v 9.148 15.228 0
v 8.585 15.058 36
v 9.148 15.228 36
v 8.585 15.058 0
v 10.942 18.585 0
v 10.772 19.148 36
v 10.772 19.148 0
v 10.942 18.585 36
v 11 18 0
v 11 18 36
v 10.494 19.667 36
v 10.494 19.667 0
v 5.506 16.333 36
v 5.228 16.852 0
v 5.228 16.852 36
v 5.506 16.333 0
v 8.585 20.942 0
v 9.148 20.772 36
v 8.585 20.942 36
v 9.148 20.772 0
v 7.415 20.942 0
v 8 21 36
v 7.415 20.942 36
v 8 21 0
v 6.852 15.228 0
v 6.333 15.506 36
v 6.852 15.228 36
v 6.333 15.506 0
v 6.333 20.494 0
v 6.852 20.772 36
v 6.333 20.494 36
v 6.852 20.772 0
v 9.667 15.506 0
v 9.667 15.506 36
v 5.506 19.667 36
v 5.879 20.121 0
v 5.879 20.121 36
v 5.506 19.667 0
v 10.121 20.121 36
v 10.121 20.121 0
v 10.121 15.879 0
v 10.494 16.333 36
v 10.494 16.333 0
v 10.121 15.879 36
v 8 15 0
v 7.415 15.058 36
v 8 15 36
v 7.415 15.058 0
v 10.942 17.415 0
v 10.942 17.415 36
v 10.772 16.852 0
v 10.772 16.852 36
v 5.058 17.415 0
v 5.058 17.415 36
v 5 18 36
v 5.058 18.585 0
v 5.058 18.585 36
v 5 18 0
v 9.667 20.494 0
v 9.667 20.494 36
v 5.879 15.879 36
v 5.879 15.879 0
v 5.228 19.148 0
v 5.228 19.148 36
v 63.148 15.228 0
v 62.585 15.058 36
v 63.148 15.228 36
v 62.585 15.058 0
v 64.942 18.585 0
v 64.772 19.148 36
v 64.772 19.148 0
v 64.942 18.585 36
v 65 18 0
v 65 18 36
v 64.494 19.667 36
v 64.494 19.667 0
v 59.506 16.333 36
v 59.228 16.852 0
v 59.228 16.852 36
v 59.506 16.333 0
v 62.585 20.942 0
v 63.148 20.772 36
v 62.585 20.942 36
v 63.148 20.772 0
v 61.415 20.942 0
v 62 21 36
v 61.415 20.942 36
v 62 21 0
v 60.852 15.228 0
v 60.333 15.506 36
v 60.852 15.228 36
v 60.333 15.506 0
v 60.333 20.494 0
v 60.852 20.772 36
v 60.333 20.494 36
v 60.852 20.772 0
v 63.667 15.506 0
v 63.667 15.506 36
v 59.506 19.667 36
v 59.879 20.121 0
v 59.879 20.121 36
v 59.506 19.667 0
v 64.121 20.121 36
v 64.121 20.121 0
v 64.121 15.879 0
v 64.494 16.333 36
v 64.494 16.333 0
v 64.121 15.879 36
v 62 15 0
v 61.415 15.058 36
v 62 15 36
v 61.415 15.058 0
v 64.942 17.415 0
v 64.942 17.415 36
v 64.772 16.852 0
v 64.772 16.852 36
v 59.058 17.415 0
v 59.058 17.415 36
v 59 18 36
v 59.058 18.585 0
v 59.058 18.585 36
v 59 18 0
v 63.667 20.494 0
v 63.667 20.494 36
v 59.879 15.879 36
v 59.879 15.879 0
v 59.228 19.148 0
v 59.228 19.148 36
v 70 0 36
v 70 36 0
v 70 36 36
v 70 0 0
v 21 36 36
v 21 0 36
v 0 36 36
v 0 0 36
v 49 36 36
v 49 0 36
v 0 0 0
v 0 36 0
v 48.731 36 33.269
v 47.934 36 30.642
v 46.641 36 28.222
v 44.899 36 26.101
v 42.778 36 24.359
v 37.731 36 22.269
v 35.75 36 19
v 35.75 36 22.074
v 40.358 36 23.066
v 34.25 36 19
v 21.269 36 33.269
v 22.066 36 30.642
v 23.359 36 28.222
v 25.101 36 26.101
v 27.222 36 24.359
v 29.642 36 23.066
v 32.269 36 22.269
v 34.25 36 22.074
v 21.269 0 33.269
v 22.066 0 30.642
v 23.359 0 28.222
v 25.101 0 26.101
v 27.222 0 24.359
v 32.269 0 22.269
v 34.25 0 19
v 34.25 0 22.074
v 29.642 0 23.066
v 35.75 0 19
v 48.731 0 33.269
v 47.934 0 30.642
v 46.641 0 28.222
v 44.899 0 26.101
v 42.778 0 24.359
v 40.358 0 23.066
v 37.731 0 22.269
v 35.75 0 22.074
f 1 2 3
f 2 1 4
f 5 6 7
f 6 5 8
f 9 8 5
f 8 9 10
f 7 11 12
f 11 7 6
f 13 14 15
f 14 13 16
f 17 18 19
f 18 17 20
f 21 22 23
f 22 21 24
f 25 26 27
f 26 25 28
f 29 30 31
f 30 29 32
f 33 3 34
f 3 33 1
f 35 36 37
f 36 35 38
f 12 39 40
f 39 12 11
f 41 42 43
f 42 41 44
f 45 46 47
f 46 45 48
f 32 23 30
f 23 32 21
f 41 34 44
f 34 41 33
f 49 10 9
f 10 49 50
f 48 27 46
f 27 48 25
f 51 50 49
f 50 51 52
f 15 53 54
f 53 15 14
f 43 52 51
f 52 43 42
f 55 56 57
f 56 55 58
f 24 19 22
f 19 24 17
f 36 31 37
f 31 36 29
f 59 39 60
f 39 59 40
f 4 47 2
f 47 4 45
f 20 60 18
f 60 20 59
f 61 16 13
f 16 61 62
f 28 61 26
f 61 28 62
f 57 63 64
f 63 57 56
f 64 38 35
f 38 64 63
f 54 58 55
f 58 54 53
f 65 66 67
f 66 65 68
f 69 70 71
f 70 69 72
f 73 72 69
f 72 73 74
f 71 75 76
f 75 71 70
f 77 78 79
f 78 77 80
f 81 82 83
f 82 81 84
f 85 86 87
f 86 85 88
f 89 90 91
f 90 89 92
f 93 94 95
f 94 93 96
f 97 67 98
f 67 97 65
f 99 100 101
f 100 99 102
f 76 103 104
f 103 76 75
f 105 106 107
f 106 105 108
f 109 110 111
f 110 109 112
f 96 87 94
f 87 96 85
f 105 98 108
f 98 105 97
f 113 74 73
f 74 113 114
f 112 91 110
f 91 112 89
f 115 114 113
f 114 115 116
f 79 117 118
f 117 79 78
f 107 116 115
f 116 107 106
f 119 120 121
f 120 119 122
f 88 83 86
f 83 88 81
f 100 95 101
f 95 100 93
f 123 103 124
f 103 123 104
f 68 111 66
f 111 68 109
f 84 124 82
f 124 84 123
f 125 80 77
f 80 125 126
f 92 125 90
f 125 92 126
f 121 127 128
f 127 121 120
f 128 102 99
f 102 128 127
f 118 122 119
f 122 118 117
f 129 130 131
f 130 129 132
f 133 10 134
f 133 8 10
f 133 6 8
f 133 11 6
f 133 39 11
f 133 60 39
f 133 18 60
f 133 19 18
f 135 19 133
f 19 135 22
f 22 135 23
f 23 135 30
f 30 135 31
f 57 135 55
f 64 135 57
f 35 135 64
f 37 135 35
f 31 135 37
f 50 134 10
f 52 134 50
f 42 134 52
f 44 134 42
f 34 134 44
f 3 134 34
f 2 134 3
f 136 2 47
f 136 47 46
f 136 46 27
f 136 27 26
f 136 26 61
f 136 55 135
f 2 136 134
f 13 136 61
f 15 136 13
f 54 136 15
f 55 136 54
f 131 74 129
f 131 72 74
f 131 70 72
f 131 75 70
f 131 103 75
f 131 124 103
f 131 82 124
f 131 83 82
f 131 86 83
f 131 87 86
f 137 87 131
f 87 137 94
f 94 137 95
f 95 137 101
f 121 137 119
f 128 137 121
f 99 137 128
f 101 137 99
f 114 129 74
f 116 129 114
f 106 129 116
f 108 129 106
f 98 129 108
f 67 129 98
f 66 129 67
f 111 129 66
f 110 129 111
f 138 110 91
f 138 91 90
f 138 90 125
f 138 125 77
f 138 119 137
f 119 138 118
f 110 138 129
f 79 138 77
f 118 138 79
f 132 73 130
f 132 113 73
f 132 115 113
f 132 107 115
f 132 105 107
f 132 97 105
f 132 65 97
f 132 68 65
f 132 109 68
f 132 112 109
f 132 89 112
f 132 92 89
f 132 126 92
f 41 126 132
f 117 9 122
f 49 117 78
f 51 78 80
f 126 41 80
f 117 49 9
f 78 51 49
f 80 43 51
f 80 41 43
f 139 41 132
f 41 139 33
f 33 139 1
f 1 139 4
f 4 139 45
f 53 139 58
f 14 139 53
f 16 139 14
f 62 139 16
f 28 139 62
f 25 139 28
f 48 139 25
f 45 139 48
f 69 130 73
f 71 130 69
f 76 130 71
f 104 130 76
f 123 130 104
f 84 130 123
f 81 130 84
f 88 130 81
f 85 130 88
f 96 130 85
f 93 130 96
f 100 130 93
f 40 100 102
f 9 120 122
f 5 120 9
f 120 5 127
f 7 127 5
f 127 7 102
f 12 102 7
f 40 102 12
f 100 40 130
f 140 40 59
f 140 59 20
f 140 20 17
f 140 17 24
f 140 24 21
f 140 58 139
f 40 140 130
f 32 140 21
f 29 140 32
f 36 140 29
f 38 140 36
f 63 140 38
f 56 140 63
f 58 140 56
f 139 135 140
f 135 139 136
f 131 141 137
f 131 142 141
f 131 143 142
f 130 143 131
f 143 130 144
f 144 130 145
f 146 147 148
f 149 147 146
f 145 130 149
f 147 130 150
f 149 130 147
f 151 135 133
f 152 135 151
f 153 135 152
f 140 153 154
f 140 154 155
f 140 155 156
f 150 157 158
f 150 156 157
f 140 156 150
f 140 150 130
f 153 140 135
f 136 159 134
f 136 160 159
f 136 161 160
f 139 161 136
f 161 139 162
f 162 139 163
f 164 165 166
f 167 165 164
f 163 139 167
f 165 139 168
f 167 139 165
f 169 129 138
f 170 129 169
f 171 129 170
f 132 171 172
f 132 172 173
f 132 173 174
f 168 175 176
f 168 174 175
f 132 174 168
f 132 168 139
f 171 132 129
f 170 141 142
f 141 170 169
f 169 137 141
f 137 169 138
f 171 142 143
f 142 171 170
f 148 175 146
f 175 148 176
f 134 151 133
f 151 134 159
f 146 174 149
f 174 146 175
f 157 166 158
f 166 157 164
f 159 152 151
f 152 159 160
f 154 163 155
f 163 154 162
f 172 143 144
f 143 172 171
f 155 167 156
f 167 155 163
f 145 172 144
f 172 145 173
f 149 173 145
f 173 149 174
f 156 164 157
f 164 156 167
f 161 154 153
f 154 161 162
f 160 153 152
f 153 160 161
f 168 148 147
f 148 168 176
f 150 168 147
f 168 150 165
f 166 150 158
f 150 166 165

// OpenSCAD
$fn = 32;

// ----------------------------------------------------------------------
// Saddle clamp: split shaft clamp
// ----------------------------------------------------------------------

// --- parameters (mm) ---
blk_l = 70;               // block length, X
blk_w = 36;               // block width, Y
blk_h = 36;               // block height
clamp_r = 14;             // shaft groove radius
hole_r = 3;               // bolt hole radius
hole_m = 8;               // bolt hole margin from the ends
saw_w = 1.5;              // saw kerf width

saw_depth = clamp_r + 3;  // saw kerf depth

difference() {
  cube([blk_l, blk_w, blk_h]);
  translate([blk_l / 2, -1, blk_h])
    rotate([-90, 0, 0])
      cylinder(h = blk_w + 2, r = clamp_r);
  for (sx = [0, 1])
    translate([sx ? blk_l - hole_m : hole_m, blk_w / 2, -1])
      cylinder(r = hole_r, h = blk_h + 2);
  translate([blk_l / 2 - saw_w / 2, -1, blk_h - saw_depth])
    cube([saw_w, blk_w + 2, saw_depth + 1]);
}
